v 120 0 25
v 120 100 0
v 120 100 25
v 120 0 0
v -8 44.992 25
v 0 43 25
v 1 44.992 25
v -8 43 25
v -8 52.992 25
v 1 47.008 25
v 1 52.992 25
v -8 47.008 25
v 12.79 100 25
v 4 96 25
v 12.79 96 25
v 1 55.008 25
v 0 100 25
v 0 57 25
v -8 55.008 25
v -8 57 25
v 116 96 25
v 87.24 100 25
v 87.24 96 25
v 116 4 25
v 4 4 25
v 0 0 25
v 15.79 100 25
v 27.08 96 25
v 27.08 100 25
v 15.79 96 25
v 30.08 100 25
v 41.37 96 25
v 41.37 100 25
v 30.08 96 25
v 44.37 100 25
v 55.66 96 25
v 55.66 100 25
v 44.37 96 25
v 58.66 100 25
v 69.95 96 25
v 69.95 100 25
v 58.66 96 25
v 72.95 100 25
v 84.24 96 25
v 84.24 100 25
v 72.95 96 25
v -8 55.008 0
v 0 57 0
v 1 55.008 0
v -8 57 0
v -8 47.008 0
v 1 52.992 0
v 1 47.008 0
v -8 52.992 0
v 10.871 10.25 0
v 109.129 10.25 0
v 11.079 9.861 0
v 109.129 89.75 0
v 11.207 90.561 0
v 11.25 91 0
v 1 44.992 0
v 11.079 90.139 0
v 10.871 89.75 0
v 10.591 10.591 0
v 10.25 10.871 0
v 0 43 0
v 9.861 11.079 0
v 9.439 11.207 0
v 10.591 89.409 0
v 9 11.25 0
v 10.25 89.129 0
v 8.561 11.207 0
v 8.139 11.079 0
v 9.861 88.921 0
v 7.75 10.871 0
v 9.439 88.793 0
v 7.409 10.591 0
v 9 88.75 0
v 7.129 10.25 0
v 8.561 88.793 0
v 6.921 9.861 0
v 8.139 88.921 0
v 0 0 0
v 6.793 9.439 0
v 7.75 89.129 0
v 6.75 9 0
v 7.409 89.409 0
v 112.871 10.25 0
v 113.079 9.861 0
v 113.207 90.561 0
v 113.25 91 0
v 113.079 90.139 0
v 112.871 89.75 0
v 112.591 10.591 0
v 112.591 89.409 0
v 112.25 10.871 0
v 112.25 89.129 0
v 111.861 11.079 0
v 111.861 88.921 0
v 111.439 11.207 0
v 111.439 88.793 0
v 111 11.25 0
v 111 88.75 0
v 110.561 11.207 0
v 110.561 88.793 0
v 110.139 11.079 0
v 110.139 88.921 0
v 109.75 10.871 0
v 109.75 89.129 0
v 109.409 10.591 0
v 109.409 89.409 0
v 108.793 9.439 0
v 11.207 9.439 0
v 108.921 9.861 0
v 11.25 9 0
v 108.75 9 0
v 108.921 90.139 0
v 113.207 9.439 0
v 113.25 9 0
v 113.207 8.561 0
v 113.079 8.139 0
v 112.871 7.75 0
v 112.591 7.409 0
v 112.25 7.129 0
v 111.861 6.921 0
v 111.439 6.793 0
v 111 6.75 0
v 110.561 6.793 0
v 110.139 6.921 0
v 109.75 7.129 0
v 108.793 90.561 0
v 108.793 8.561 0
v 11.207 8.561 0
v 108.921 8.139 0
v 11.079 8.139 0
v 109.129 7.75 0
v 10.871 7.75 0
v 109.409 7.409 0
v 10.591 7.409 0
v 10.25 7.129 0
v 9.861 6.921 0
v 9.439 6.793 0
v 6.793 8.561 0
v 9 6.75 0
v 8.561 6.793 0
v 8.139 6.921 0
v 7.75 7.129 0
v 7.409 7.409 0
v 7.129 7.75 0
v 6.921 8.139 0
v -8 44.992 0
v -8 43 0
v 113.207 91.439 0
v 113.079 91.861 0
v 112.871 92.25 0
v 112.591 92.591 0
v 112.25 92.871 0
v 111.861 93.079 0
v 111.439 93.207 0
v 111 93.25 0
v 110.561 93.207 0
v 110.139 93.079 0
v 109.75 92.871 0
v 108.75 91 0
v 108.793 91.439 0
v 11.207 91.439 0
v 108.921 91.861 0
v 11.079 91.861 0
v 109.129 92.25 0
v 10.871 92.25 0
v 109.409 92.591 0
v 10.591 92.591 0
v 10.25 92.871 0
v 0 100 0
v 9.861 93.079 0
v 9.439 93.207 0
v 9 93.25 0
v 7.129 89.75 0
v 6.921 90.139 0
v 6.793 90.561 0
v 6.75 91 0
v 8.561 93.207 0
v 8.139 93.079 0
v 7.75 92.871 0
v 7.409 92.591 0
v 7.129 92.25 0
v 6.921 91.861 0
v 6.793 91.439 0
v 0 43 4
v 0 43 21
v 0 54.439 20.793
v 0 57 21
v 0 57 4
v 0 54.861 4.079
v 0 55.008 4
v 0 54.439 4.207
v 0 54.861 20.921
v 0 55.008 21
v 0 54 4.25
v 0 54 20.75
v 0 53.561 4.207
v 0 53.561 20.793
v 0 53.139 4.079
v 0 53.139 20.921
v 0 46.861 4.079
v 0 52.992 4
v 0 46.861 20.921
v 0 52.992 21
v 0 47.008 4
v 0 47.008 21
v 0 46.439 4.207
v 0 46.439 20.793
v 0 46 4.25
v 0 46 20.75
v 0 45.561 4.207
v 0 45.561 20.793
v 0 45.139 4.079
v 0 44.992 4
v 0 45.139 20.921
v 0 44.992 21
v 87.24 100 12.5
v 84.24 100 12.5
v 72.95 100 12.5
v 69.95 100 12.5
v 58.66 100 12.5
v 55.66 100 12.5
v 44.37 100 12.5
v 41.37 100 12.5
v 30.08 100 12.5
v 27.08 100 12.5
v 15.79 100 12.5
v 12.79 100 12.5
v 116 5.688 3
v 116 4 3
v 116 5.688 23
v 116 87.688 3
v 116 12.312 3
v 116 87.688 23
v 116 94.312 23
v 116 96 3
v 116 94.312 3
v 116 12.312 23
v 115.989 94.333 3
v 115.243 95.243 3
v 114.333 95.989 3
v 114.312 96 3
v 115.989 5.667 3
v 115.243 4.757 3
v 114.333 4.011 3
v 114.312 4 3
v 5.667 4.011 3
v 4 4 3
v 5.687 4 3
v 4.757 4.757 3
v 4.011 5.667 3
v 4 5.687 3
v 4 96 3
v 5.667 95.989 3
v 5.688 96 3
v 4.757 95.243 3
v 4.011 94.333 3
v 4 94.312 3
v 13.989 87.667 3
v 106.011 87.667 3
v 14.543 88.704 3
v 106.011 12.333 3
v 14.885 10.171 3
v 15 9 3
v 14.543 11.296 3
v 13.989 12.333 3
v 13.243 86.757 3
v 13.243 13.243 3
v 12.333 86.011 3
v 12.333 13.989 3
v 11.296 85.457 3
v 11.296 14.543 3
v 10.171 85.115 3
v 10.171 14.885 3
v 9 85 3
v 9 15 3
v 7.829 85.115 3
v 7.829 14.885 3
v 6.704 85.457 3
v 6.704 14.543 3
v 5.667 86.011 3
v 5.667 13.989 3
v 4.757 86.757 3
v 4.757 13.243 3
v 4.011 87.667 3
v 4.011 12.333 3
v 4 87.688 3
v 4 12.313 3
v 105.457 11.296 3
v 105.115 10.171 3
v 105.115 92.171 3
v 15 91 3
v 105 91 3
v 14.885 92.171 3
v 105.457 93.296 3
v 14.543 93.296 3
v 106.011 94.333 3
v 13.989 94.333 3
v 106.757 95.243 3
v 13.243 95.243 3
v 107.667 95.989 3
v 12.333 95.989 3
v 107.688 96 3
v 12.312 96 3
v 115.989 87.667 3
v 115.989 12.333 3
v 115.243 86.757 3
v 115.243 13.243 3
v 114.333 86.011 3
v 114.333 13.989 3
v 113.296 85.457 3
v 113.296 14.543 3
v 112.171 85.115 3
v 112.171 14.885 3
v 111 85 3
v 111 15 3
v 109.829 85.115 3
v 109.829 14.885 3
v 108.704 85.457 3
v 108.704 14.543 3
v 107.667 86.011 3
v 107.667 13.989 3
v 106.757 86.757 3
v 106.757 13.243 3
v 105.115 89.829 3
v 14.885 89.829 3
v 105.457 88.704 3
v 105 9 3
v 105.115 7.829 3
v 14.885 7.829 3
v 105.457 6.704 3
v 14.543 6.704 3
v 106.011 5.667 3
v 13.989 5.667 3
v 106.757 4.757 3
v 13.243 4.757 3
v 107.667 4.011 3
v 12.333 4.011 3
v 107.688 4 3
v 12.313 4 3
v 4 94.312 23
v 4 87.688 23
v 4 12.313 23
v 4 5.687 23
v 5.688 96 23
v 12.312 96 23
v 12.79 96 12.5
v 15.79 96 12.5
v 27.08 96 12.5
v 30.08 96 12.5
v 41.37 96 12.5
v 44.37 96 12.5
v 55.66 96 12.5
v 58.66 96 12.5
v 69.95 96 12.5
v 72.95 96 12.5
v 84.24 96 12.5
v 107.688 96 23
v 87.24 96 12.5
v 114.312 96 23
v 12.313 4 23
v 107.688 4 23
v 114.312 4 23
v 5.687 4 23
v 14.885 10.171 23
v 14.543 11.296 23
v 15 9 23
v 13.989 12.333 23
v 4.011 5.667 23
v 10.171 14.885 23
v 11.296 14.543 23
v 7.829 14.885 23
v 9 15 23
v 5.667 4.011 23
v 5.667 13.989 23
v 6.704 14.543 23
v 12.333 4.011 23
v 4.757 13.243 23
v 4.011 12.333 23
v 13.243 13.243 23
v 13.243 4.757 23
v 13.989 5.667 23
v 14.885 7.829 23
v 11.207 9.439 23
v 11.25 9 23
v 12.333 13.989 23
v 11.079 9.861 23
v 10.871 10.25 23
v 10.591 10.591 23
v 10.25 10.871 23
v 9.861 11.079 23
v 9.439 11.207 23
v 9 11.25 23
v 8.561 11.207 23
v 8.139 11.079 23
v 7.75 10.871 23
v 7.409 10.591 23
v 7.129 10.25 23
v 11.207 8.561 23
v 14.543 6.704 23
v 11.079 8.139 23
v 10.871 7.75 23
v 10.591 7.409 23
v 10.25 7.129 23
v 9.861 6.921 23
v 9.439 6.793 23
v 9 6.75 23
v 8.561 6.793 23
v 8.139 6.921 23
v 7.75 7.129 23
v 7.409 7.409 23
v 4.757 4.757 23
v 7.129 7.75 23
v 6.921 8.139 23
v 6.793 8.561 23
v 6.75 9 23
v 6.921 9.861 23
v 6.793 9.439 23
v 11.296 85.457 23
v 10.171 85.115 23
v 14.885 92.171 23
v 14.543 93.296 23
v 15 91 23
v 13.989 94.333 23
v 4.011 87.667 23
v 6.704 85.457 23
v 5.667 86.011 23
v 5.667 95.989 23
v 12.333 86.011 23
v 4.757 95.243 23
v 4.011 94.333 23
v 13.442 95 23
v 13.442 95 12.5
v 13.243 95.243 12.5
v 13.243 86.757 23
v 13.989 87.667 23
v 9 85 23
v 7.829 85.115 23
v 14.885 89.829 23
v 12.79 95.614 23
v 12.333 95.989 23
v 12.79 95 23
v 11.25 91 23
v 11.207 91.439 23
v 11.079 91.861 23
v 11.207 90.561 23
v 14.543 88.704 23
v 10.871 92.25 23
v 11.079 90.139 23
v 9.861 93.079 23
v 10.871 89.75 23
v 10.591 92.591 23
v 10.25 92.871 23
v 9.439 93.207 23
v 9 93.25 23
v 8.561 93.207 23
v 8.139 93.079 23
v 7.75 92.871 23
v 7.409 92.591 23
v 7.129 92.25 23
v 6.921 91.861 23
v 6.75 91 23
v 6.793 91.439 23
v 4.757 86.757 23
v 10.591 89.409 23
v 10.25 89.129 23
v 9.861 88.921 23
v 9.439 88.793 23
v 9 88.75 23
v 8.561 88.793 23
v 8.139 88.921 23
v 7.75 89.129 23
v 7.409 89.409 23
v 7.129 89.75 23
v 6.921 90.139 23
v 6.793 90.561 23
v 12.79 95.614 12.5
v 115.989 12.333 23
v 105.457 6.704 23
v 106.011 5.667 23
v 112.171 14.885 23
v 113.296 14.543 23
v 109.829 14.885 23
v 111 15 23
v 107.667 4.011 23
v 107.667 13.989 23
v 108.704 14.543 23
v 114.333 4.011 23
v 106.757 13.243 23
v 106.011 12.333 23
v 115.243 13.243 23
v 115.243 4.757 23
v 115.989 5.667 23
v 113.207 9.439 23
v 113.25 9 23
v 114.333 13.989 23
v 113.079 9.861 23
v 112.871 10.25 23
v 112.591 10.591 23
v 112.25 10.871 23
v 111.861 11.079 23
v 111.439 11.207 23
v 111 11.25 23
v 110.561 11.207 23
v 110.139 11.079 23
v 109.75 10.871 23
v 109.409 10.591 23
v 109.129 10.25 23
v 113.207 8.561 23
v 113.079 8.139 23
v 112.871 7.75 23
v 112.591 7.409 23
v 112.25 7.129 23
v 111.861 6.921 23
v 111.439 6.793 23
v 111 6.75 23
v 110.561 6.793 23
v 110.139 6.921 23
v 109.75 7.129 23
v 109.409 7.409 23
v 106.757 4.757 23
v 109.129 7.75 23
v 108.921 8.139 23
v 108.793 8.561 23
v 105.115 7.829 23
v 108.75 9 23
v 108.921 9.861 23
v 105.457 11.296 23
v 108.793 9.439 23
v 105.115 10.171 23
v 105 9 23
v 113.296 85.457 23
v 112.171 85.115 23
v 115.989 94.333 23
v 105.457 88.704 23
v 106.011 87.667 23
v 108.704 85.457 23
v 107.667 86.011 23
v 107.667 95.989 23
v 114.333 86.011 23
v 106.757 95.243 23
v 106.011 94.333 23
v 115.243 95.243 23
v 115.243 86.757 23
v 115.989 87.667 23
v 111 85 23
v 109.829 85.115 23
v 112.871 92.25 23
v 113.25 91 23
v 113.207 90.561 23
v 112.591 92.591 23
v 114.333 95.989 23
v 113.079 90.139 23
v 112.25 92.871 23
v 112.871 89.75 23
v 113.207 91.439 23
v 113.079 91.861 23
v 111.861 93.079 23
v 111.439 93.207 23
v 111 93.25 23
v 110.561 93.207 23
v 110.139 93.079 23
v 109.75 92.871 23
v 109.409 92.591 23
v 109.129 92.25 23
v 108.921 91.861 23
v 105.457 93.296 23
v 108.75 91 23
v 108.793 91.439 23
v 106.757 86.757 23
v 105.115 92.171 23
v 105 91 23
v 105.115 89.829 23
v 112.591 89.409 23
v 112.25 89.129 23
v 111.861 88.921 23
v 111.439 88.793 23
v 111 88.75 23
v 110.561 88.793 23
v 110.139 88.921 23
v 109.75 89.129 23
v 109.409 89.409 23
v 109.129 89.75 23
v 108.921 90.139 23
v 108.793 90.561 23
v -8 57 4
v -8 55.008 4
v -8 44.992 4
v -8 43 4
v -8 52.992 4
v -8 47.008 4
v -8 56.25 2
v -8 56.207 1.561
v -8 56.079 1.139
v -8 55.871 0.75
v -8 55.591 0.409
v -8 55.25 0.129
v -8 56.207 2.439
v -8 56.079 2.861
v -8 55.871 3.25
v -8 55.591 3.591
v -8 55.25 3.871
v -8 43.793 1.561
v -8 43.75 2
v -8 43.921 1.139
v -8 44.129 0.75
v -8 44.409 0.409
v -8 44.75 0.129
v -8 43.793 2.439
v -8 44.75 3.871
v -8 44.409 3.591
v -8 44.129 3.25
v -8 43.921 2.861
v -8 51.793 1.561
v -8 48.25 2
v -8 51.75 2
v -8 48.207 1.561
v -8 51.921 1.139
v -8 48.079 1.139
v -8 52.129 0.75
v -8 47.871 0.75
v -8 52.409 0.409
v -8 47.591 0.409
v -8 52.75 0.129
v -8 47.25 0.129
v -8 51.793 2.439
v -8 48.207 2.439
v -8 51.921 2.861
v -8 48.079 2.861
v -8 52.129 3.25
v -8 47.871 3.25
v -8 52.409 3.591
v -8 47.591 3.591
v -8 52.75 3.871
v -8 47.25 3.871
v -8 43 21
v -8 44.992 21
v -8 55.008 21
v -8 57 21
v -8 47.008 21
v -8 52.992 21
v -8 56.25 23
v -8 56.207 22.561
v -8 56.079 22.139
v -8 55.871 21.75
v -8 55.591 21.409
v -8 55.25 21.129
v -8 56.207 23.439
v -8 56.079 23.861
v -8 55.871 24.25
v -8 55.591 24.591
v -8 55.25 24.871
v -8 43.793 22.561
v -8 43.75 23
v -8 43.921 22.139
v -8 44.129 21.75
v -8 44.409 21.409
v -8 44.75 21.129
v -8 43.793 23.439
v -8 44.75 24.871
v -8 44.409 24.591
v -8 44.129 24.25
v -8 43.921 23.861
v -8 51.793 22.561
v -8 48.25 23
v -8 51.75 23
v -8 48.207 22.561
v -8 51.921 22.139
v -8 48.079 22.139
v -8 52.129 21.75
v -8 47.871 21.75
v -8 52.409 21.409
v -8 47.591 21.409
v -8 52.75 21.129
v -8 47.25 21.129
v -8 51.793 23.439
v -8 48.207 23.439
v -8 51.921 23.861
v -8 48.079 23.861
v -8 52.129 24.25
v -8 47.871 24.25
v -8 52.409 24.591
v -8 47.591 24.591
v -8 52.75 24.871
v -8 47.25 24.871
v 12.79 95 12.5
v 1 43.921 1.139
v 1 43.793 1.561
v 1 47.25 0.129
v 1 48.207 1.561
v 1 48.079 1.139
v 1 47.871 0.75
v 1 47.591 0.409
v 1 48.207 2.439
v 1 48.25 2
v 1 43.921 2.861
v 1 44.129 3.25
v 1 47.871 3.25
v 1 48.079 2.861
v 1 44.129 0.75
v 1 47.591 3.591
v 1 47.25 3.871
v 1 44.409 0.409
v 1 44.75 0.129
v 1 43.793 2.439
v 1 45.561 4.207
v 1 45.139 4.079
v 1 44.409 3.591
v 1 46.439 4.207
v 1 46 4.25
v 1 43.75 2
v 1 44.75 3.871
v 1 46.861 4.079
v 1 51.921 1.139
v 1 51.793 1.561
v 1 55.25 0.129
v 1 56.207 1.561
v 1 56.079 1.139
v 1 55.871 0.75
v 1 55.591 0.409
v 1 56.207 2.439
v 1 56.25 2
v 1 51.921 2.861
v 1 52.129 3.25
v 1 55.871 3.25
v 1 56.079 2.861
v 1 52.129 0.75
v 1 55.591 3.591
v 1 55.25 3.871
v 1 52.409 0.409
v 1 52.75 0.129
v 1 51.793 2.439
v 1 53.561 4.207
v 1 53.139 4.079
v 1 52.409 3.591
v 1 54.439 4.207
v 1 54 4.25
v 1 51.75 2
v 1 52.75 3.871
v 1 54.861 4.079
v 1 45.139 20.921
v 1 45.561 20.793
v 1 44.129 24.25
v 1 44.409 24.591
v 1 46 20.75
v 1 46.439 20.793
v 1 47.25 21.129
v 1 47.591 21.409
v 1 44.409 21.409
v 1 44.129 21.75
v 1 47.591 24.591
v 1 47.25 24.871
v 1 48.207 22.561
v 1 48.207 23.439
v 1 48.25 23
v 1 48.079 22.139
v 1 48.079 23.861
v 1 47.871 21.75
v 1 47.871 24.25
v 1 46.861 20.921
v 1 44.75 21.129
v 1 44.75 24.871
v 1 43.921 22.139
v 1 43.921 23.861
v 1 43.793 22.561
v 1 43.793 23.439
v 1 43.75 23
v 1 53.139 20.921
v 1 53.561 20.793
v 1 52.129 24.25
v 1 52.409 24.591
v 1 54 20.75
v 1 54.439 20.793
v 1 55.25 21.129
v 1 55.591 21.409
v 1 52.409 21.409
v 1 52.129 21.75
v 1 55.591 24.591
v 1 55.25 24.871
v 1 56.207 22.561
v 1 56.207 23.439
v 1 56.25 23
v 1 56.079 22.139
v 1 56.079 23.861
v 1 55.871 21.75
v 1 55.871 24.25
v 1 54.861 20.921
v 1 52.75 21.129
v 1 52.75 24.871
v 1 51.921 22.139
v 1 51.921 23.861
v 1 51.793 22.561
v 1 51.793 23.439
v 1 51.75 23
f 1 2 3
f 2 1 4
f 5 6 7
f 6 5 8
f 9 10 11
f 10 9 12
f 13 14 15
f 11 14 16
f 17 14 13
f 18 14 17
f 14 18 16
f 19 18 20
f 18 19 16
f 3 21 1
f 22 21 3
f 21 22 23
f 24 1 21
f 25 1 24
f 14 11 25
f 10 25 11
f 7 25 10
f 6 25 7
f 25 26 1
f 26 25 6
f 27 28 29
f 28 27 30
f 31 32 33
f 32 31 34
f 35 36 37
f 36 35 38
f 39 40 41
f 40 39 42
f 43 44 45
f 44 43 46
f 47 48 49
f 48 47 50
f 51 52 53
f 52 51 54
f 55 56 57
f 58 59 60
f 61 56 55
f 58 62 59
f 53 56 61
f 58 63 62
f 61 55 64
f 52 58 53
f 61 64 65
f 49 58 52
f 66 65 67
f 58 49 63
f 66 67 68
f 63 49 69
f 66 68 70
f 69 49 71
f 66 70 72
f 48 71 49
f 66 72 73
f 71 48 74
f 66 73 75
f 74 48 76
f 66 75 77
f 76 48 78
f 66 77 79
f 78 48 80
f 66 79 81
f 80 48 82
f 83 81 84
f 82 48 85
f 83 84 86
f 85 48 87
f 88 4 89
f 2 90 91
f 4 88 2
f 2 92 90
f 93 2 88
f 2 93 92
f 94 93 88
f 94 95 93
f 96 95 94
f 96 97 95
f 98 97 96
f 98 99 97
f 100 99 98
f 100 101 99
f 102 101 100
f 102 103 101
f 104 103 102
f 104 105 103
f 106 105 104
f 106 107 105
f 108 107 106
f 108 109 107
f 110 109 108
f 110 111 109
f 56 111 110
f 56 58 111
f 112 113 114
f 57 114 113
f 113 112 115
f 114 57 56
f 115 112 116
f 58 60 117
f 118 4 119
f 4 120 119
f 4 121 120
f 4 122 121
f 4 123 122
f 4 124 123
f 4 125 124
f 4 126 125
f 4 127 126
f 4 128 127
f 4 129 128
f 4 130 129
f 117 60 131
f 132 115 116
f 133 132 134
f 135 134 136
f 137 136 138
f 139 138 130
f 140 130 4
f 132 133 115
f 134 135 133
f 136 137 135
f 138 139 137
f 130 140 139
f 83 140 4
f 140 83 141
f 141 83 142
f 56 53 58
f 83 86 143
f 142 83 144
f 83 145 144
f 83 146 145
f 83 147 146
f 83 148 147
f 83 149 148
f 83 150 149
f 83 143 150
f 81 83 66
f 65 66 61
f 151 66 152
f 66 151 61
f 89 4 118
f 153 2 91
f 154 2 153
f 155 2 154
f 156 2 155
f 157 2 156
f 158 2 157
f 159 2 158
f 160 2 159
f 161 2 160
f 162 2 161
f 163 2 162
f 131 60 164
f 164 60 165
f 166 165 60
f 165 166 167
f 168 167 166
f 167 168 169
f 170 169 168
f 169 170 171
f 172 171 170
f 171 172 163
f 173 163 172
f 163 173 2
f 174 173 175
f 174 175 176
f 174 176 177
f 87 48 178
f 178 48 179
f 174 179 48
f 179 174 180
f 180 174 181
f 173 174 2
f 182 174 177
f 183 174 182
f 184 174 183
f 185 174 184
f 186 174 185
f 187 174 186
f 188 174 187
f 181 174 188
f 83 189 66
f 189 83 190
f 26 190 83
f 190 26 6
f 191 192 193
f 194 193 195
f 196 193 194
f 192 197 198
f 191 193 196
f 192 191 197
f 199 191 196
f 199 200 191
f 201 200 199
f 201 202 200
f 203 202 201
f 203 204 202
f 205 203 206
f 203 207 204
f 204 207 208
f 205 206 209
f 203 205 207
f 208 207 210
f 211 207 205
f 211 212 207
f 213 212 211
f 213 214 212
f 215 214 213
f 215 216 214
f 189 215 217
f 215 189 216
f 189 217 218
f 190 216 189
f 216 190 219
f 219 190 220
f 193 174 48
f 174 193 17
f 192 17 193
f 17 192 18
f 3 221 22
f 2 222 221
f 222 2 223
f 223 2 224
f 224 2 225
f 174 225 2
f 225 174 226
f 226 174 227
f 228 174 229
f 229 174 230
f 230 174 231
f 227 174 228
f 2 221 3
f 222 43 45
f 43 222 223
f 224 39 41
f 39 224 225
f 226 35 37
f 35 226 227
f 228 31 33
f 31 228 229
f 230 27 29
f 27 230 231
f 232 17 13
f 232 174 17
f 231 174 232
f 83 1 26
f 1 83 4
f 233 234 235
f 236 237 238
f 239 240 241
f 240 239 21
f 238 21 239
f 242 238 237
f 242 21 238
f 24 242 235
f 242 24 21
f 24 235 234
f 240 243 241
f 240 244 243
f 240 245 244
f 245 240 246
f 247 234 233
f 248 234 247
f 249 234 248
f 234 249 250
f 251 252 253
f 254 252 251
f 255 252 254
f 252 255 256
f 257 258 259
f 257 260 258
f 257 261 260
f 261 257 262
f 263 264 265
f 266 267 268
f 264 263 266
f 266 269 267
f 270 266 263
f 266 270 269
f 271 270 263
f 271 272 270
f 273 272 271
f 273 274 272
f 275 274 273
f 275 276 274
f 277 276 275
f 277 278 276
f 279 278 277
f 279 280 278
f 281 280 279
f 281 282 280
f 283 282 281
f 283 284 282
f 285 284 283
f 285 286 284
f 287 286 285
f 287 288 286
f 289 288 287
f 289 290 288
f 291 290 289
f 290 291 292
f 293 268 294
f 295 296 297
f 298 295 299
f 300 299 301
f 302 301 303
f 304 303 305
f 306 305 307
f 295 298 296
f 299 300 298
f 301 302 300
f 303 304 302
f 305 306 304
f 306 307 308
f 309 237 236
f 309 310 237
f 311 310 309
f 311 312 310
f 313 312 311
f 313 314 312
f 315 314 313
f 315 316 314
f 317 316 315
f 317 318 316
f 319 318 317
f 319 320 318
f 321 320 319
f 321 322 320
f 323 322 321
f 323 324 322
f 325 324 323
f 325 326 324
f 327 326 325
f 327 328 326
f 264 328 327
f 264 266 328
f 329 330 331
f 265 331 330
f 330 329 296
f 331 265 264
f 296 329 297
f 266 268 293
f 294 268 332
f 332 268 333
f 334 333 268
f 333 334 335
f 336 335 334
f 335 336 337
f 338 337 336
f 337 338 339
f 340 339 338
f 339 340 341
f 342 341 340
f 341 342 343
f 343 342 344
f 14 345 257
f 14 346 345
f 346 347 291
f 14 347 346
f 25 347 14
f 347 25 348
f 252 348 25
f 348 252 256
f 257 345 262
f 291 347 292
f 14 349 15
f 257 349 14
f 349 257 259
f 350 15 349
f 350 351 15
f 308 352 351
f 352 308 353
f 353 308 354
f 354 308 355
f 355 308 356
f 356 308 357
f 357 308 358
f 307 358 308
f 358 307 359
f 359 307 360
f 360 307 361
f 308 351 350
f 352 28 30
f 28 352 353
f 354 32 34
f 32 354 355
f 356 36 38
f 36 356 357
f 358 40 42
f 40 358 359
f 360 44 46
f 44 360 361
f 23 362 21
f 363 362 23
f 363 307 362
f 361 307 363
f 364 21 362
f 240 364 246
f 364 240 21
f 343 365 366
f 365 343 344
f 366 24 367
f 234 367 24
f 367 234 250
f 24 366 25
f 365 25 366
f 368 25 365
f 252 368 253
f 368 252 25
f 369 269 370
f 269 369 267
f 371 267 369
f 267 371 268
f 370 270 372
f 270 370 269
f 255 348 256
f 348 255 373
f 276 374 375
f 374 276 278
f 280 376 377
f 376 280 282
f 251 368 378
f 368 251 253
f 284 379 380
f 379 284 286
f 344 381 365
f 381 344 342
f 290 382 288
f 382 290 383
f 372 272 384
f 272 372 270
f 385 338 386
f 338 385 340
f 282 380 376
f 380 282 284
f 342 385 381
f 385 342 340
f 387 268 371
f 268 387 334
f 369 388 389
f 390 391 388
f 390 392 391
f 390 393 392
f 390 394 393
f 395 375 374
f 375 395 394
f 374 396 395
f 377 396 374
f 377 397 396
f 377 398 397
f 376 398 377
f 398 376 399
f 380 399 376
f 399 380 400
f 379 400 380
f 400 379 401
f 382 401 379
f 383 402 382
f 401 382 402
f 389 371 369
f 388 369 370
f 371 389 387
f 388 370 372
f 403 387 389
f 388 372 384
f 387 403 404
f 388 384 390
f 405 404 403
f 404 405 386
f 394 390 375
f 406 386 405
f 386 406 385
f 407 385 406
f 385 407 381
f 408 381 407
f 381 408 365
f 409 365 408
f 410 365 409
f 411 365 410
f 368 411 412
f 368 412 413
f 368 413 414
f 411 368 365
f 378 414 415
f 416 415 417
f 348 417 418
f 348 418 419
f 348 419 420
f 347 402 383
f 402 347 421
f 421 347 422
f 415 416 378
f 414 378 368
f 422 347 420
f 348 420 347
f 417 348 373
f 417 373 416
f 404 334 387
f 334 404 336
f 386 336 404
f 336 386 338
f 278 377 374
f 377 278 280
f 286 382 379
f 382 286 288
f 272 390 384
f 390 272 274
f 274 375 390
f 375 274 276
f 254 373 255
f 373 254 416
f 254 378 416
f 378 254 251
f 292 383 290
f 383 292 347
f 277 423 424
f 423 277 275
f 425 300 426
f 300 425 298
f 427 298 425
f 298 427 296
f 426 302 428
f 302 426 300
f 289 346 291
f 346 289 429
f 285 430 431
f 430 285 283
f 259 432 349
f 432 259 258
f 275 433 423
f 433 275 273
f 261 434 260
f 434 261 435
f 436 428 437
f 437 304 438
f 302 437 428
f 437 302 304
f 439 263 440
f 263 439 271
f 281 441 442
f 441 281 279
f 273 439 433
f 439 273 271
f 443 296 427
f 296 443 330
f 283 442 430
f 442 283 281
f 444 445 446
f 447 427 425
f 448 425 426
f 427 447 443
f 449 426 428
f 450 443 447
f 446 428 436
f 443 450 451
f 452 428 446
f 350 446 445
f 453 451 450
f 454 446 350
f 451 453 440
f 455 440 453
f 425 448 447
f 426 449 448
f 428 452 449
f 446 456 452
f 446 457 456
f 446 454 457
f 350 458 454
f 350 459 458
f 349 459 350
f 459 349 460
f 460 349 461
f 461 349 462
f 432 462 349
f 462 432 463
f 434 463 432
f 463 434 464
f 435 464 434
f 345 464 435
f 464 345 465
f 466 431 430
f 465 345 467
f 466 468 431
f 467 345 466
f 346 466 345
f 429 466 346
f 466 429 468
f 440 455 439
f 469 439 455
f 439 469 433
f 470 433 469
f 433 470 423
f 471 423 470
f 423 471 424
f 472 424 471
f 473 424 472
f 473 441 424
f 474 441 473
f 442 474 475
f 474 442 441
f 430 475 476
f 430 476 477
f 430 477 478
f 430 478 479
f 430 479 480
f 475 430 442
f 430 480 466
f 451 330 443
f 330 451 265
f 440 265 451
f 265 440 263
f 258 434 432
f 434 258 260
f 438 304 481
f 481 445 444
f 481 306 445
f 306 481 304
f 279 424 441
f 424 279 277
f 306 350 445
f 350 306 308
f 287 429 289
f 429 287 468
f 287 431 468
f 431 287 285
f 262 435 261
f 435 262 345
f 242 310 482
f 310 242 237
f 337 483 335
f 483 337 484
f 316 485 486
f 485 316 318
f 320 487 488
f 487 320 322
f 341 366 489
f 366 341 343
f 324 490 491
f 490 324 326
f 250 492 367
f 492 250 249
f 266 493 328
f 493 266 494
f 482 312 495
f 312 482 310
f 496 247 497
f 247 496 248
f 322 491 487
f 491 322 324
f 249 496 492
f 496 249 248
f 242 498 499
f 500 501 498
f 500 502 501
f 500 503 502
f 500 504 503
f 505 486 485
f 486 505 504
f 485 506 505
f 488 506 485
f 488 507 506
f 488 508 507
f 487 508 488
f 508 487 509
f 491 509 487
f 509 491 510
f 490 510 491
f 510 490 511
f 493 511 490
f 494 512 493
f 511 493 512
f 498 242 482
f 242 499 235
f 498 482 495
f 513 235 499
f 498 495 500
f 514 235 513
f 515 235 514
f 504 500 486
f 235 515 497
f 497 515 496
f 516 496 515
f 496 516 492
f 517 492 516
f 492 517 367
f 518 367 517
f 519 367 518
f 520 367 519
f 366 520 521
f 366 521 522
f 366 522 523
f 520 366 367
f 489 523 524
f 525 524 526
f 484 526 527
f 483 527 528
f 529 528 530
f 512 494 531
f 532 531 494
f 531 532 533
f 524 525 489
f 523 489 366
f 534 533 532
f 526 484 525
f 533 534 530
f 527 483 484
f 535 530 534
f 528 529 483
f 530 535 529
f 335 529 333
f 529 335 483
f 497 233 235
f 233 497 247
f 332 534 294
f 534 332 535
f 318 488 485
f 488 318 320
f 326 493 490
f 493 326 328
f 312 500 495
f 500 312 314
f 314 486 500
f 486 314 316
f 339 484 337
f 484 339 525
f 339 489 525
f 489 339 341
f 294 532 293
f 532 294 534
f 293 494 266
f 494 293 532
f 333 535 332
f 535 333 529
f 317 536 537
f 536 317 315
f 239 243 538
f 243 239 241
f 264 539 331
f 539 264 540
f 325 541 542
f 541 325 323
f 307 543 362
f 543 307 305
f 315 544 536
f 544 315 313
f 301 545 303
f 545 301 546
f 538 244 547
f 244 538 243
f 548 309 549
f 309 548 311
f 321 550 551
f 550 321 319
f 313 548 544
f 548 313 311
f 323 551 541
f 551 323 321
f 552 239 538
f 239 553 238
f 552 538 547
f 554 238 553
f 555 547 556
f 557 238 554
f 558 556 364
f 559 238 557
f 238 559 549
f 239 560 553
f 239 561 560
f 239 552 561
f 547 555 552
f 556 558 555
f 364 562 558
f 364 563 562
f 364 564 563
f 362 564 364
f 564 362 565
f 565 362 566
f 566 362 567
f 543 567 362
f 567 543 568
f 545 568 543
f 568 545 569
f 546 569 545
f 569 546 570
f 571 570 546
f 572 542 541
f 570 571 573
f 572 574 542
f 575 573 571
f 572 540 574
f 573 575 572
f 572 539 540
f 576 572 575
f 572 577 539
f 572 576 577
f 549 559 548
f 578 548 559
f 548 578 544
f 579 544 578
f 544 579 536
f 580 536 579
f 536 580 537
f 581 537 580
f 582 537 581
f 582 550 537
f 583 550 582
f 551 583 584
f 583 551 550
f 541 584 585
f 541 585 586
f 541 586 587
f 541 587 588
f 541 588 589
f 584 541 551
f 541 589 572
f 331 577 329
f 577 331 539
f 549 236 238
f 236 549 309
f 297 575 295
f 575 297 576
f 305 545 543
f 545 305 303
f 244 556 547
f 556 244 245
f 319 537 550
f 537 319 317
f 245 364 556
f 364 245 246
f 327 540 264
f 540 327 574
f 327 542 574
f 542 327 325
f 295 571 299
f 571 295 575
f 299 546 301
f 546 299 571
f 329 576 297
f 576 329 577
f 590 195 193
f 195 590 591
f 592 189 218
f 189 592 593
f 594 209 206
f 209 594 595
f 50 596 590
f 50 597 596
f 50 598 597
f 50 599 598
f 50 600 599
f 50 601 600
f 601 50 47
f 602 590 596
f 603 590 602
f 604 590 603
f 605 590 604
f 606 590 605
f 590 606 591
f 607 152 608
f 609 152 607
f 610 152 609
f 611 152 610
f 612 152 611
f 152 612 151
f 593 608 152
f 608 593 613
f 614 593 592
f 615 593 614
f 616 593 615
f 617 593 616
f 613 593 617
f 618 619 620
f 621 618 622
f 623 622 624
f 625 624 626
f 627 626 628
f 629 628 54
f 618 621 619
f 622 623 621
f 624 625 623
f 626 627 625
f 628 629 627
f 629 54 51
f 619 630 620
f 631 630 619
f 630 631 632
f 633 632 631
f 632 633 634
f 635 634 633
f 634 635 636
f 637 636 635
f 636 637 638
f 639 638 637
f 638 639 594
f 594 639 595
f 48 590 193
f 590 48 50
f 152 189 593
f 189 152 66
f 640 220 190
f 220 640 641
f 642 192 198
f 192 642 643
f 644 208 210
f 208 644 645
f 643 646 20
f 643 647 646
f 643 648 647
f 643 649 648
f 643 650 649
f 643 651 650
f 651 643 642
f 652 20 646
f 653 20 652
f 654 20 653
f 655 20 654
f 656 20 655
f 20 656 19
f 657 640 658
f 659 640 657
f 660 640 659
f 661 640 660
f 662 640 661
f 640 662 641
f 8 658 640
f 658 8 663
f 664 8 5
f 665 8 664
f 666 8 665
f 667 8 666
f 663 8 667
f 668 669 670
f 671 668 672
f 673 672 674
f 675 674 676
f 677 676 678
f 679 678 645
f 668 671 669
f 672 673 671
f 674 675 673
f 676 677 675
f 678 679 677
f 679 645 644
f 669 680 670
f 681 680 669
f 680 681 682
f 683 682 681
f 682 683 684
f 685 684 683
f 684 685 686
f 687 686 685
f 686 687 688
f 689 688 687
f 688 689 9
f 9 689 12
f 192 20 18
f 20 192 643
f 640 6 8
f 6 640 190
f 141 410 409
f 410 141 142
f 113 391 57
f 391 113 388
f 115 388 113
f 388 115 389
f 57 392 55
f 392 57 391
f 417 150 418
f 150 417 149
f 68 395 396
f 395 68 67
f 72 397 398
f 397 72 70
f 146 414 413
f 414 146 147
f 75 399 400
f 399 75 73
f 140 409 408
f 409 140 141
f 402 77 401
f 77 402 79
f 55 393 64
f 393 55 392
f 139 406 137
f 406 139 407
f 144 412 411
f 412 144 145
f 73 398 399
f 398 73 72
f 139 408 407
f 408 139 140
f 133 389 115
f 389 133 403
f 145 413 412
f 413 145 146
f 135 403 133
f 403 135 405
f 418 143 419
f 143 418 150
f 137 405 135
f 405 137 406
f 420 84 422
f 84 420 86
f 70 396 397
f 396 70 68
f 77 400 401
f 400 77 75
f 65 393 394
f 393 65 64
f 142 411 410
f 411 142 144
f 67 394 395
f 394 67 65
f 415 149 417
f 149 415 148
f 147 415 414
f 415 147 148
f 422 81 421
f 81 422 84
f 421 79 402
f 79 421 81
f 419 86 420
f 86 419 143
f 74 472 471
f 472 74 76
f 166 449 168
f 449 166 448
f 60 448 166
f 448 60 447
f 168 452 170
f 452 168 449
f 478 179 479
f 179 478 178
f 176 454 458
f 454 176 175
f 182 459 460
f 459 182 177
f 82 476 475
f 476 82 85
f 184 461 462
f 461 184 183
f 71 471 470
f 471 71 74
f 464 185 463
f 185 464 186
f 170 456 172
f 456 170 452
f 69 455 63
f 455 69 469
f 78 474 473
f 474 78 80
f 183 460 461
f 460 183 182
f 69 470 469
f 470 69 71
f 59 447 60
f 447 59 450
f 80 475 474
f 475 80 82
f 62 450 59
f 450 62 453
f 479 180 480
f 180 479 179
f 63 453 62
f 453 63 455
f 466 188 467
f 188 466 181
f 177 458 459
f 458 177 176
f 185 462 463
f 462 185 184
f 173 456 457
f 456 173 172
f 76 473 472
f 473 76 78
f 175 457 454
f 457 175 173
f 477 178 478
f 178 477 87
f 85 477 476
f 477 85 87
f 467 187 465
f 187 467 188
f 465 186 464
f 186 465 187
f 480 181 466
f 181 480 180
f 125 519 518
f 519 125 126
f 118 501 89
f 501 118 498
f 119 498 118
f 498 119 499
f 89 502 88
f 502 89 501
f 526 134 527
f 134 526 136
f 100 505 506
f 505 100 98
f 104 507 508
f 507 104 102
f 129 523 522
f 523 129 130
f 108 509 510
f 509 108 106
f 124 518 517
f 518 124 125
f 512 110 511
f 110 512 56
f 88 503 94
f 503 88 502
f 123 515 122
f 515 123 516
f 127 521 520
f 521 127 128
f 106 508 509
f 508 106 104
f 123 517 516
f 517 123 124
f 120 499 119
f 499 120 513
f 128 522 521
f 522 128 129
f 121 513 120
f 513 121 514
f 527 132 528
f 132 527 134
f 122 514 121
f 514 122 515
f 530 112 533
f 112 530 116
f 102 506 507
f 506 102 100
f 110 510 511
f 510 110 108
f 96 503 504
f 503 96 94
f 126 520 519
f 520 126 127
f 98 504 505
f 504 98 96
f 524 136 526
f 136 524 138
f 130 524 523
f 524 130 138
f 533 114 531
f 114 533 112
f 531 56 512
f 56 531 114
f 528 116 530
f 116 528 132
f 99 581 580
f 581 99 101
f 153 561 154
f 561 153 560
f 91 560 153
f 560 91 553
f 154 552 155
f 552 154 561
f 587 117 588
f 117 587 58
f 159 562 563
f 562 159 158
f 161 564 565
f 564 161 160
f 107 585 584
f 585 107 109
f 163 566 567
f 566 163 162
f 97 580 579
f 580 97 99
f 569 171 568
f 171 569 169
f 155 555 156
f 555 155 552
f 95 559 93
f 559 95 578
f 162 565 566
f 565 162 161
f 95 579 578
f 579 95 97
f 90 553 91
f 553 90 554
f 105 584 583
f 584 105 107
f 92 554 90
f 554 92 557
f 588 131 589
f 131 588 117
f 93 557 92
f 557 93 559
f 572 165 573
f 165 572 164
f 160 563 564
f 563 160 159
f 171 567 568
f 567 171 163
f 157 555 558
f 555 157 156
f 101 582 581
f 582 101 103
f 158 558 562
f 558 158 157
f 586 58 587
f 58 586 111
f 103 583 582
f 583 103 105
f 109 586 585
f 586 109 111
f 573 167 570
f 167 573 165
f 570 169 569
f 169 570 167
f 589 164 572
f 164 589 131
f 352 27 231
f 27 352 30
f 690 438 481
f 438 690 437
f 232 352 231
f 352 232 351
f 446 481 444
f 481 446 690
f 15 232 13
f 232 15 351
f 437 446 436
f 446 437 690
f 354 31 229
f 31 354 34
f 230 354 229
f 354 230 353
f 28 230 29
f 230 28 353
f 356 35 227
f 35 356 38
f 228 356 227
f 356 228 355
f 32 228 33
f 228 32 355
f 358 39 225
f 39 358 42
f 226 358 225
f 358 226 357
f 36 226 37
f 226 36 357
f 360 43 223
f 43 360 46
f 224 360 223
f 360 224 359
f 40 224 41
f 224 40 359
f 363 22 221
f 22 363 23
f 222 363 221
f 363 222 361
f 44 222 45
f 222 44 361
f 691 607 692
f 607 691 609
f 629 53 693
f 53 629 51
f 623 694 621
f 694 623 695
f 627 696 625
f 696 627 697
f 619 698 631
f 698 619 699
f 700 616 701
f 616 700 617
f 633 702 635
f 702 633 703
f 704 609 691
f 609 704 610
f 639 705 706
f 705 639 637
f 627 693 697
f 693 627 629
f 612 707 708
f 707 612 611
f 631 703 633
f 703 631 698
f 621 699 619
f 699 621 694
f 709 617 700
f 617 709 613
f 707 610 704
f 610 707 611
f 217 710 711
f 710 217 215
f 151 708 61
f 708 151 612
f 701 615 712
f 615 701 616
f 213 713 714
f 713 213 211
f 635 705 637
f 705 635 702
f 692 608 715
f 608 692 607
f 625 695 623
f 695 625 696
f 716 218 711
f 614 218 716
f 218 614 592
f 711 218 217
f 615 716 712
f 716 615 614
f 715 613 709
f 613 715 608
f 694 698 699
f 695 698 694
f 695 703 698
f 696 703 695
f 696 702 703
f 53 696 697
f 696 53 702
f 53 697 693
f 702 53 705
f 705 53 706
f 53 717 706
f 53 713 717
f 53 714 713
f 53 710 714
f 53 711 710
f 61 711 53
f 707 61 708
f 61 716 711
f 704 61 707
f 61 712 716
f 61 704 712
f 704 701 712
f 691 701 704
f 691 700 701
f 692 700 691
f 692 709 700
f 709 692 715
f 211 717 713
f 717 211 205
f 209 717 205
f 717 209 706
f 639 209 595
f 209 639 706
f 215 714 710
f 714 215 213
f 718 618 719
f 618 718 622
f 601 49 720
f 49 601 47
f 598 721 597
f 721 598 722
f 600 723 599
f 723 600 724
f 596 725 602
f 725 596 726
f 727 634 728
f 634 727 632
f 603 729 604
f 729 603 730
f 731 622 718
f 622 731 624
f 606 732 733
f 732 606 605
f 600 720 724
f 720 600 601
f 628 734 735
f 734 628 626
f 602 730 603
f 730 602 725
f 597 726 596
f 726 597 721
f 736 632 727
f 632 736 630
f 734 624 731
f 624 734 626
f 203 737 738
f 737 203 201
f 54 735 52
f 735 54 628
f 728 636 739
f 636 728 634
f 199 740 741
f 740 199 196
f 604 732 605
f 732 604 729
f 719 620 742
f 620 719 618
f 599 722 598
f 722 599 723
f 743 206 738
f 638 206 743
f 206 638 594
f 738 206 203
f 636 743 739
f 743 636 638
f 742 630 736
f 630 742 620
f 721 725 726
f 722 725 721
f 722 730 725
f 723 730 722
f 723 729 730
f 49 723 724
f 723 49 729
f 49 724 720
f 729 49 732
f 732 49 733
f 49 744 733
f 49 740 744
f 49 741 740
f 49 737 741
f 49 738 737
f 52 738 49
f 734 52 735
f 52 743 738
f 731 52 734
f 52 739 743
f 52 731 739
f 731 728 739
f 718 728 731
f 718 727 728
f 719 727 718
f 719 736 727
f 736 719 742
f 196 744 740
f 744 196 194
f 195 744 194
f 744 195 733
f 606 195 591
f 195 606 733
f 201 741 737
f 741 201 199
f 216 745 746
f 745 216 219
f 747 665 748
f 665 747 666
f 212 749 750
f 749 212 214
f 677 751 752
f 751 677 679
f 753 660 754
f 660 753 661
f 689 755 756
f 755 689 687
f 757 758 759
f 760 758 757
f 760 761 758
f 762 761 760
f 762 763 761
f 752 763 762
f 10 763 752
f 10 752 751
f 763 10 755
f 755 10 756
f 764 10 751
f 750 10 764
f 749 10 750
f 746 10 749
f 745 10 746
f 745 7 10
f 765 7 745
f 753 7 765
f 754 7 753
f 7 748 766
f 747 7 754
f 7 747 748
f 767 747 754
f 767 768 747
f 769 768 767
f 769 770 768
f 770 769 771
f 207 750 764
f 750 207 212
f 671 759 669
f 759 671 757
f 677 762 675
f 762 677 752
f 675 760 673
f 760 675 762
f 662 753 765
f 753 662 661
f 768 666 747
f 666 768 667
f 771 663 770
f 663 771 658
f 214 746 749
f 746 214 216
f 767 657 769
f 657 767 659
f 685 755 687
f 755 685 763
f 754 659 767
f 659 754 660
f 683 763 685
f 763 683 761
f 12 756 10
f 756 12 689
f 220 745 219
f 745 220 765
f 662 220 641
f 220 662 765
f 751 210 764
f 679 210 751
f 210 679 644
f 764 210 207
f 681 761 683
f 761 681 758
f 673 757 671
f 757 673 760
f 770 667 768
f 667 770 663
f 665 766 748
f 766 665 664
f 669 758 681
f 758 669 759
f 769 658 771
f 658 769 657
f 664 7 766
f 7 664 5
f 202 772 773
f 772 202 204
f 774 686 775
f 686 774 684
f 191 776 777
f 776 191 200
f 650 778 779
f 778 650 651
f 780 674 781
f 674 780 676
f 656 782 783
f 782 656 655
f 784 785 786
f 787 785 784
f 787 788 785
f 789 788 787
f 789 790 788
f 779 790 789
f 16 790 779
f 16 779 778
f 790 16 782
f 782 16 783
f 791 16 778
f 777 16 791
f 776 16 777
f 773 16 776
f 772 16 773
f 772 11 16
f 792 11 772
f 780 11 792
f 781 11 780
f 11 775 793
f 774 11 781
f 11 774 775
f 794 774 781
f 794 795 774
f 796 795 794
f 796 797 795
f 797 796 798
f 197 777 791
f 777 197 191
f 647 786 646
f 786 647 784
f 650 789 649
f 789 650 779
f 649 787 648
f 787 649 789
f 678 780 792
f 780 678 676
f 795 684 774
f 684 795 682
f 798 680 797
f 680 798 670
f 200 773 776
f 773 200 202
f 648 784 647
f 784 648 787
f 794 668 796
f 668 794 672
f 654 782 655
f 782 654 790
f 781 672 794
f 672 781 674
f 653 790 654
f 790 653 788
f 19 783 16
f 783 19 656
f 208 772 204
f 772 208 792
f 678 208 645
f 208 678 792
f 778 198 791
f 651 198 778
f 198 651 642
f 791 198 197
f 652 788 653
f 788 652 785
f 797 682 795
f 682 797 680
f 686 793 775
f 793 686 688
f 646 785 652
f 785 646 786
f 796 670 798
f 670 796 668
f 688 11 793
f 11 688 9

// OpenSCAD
$fn = 32;

// ----------------------------------------------------------------------
// Enclosure body: 120 x 100 x 25 mm, wall 4 mm
// ----------------------------------------------------------------------

// --- parameters (mm) ---
length = 120;             // outside length, X
width = 100;              // outside width, Y
height = 25;              // outside height, Z
wall = 4;                 // side wall thickness
floor_t = 3;              // floor thickness
boss_d = 12;              // corner boss diameter
boss_h = 20;              // corner boss height above the floor
boss_hole_d = 4.5;        // lid screw clearance in the boss
boss_lip = 9;             // boss centre inset from the corner
ear_w = 14;               // mounting ear width
ear_t = 4;                // mounting ear thickness
ear_ext = 8;              // mounting ear reach
ear_hole_d = 4.5;         // mounting ear drills
vent_slots = 6;           // vent slots in the long wall
vent_w = 3;               // vent slot width
vent_h = 20;              // vent slot height
vent_pitch = 14.29;       // vent slot pitch
vent_z = 12.5;            // vent slot sill height

module shell() {
  difference() {
    cube([length, width, height]);
    /* hollow, open at the top */
    translate([wall, wall, floor_t])
      cube([length - 2 * wall, width - 2 * wall, height]);
  }
}

module bosses() {
  /* corner bosses, sunk 1 mm into the floor */
  for (sx = [0, 1]) for (sy = [0, 1])
    translate([sx * (length - 2 * boss_lip) + boss_lip, sy * (width - 2 * boss_lip) + boss_lip, floor_t - 1])
      cylinder(h = boss_h + 1, d = boss_d);
}

module ears() {
  /* mounting ears on the short walls, sunk into the wall */
  for (sz = [0, 1])
    translate([-ear_ext, width / 2 - ear_w / 2, sz * (height - ear_t)])
      cube([ear_ext + 2.5, ear_w, ear_t]);
}

difference() {
  union() {
    shell();
    bosses();
    ears();
  }
  /* boss screw holes */
  for (sx = [0, 1]) for (sy = [0, 1])
    translate([sx * (length - 2 * boss_lip) + boss_lip, sy * (width - 2 * boss_lip) + boss_lip, -1]) cylinder(h = floor_t + boss_h + 2, d = boss_hole_d);
  /* vent grille in the +Y wall */
  for (i = [0 : vent_slots - 1]) translate([vent_pitch * (i + 1) - vent_w / 2, width - wall - 1, vent_z]) cube([vent_w, wall + 2, vent_h]);
  for (sz = [0, 1]) for (sx = [0, 1]) translate([-ear_ext - 1, width / 2 + (2 * sx - 1) * (ear_w / 2 - 3), sz * (height - ear_t) + ear_t / 2]) rotate([0, 90, 0]) cylinder(h = ear_ext + 2, d = ear_hole_d);
}
